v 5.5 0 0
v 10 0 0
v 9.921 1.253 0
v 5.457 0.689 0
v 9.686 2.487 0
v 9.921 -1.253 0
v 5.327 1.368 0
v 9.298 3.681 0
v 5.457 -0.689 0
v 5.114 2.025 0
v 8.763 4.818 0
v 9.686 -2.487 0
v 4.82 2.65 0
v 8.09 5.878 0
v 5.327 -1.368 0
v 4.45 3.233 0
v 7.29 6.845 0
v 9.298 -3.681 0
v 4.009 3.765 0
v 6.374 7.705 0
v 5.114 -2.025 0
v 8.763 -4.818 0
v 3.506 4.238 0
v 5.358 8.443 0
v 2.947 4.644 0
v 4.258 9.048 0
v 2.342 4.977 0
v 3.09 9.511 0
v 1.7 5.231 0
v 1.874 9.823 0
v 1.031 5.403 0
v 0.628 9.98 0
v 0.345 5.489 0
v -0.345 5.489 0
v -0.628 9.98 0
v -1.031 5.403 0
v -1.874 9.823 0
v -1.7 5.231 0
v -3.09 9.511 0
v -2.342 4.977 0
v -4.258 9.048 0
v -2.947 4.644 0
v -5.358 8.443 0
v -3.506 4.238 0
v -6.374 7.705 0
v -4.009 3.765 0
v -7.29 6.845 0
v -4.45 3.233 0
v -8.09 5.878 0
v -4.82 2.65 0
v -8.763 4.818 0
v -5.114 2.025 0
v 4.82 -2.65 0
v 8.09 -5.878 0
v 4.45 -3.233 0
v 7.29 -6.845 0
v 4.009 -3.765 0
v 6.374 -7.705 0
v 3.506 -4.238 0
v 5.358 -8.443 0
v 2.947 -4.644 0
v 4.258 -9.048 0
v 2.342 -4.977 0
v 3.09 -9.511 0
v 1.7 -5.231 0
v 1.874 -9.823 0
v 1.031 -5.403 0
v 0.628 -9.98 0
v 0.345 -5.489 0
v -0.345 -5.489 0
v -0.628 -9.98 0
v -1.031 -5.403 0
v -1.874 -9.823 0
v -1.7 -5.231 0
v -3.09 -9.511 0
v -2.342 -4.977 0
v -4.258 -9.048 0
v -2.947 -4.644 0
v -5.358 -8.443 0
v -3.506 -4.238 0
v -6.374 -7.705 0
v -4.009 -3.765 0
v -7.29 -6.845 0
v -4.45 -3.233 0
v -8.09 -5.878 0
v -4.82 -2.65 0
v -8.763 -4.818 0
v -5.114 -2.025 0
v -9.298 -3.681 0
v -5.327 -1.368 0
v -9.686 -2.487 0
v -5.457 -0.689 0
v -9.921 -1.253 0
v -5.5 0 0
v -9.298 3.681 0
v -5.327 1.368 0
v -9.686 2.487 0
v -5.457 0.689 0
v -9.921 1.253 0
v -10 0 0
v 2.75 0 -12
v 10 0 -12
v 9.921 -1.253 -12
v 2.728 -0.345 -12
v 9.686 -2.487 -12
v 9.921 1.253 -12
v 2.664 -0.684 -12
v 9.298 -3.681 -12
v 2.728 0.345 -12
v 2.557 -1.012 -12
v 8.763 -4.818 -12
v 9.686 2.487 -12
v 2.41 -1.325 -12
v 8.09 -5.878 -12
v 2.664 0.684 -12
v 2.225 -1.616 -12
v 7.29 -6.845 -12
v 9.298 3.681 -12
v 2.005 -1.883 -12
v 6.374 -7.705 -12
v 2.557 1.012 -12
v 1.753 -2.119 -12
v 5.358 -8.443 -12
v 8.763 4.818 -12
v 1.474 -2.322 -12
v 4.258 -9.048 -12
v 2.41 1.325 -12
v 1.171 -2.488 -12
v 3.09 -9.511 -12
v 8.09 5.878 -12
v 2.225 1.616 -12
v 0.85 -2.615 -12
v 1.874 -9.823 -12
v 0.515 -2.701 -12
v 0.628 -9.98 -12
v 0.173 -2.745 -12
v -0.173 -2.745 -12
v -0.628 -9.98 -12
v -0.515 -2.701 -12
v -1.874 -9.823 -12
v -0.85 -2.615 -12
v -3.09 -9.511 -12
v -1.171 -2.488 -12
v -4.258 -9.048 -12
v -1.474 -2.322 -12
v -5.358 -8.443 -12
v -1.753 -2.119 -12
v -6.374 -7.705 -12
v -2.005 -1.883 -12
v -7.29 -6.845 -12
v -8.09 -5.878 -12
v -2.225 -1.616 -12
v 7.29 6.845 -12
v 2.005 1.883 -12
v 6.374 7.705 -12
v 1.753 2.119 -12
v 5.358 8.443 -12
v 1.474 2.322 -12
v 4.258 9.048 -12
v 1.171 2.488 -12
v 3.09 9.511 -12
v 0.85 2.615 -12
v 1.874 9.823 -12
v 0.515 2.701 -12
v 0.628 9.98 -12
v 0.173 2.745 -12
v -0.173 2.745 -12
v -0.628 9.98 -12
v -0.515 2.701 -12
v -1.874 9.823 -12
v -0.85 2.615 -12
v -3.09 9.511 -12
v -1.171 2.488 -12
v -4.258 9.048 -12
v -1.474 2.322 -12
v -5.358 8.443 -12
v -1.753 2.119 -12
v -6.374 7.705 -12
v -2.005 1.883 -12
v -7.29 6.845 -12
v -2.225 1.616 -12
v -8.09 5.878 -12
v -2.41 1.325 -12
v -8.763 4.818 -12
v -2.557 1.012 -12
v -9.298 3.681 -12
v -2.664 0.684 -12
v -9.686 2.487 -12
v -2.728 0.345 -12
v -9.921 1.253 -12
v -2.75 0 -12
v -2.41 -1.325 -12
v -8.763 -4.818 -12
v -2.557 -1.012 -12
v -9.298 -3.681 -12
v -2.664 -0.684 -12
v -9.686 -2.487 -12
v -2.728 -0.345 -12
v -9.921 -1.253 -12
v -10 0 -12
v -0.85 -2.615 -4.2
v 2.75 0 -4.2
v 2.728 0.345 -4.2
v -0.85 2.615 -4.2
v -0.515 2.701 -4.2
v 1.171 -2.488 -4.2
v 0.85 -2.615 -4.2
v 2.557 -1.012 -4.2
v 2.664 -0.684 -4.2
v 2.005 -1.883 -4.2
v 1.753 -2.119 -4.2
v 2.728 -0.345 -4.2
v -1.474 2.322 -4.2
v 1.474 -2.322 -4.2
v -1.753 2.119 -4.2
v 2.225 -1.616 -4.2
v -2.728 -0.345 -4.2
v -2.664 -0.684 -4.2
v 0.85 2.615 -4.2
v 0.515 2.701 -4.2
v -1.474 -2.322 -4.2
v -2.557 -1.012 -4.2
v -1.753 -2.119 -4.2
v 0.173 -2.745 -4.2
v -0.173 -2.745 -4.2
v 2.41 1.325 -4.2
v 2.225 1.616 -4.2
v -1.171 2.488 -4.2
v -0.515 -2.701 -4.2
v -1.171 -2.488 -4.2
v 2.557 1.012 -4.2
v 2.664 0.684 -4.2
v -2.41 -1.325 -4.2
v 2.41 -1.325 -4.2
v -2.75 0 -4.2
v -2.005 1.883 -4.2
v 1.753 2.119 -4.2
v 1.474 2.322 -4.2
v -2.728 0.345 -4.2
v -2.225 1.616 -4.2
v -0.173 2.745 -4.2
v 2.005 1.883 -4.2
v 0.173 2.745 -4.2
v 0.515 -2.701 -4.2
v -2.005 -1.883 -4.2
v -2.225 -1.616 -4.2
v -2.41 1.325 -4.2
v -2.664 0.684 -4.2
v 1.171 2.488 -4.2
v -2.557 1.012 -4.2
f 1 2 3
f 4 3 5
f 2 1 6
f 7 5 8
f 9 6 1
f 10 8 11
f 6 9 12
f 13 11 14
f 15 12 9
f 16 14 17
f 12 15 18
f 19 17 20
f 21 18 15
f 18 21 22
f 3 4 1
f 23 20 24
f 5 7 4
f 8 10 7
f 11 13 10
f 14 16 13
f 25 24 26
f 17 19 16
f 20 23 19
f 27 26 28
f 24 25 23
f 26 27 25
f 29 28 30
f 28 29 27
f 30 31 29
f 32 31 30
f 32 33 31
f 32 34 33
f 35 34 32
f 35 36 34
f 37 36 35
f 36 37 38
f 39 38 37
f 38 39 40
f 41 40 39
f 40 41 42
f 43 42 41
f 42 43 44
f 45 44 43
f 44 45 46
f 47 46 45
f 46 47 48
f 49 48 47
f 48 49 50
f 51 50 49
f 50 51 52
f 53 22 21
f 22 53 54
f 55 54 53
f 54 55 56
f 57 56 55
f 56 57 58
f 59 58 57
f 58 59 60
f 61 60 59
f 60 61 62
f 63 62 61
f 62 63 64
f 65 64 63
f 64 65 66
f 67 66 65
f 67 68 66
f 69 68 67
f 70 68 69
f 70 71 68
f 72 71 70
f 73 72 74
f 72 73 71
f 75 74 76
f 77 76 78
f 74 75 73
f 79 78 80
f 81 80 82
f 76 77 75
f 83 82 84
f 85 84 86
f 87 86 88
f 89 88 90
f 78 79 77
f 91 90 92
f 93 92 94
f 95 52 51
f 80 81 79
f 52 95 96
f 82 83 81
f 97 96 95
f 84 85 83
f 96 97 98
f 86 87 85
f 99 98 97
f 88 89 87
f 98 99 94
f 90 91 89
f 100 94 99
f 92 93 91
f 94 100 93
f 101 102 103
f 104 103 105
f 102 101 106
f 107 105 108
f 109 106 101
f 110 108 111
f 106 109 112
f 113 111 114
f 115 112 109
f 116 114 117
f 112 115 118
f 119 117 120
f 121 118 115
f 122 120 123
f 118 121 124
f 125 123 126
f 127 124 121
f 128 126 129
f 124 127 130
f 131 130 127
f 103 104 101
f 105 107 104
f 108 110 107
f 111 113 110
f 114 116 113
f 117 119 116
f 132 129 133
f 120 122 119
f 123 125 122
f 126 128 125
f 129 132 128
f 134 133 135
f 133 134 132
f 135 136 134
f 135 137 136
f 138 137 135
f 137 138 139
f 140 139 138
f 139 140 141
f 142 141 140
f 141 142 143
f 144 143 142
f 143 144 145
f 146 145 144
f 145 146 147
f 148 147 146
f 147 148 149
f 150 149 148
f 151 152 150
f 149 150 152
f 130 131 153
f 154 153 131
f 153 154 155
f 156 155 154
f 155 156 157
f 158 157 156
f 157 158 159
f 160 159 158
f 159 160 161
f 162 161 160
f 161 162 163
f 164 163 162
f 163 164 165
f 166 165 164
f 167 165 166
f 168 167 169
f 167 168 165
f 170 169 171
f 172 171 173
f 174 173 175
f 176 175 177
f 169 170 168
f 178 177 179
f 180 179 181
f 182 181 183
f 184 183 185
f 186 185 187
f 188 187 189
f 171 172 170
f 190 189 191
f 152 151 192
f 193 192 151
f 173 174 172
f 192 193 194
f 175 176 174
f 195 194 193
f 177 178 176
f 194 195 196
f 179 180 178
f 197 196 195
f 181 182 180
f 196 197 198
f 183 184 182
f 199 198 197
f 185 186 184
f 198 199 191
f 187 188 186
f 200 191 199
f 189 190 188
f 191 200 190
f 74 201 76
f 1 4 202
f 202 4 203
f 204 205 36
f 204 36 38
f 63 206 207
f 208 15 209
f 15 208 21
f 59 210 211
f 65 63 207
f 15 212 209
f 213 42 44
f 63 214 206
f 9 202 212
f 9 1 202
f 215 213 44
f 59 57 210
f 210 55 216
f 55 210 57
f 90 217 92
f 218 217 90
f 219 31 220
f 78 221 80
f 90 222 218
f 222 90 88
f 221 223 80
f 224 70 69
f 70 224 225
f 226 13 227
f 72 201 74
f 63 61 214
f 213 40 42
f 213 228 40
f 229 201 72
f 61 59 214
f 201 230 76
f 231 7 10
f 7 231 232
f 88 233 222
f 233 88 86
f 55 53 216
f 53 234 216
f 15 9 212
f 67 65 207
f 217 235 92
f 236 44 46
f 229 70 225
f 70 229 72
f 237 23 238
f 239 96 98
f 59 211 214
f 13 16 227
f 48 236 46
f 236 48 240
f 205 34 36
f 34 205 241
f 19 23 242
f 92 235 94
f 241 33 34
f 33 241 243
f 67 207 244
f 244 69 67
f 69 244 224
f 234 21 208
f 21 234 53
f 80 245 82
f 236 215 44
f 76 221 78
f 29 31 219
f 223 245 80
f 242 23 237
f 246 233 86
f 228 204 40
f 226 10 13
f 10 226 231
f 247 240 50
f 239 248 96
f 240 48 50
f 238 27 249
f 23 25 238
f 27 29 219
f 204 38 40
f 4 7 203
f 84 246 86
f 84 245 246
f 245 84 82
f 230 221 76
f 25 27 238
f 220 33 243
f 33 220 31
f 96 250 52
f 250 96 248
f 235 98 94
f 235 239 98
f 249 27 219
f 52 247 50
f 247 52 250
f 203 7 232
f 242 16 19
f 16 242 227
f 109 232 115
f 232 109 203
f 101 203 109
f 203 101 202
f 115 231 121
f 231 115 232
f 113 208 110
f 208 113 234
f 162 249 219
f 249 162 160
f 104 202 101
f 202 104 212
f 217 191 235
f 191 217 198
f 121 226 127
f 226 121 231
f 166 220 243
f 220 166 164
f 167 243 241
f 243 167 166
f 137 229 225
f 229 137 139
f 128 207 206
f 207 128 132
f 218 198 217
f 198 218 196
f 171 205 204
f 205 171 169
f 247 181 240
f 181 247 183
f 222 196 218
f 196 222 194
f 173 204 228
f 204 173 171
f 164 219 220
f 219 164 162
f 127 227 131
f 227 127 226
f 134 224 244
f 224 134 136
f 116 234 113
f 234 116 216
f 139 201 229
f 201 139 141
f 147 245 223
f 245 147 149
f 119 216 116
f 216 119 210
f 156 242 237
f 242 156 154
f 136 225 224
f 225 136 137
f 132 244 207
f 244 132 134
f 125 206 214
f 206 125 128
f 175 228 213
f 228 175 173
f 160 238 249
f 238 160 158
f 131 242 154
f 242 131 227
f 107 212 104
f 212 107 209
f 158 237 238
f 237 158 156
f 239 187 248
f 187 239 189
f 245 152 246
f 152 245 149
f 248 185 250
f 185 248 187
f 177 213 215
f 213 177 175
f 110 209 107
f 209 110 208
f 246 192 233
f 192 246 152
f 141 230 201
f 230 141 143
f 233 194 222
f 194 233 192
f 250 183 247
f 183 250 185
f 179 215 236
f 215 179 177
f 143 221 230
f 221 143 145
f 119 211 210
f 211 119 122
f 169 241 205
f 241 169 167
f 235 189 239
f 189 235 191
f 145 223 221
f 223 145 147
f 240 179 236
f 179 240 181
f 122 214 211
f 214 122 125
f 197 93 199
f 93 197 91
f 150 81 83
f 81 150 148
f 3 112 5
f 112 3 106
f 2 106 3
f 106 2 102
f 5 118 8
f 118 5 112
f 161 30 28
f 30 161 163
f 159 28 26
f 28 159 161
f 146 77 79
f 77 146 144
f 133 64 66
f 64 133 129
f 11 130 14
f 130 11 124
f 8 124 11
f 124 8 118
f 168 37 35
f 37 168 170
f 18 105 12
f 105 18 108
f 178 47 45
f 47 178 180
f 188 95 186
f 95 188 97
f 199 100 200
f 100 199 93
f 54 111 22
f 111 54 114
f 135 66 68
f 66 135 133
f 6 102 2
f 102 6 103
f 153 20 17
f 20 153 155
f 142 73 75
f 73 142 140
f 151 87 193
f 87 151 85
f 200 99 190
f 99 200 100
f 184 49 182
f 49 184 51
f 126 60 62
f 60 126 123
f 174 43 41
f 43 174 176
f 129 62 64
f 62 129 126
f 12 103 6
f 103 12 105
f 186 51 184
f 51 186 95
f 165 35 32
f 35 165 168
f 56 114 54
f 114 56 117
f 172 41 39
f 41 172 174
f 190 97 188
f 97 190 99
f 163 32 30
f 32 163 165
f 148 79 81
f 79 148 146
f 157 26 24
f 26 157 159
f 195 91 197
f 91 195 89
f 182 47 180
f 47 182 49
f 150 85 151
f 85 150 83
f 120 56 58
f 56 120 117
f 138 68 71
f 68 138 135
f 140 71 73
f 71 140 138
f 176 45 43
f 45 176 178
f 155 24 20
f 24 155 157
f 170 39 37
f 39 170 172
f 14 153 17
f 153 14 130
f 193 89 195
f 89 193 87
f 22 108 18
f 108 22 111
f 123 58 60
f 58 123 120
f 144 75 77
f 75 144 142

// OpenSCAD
$fn = 50;


difference() {
	union() {
		translate(v = [0, 0, -12.0000000000]) {
			cylinder(h = 12, r = 10.0000000000);
		}
	}
	union() {
		translate(v = [0, 0, 0]) {
			rotate(a = [0, 0, 0]) {
				difference() {
					union() {
						#translate(v = [0, 0, -12.0000000000]) {
							cylinder(h = 12, r = 2.2500000000);
						}
						#translate(v = [0, 0, -4.2000000000]) {
							cylinder(h = 4.2000000000, r = 10.0000000000, r1 = 2.7500000000, r2 = 5.5000000000);
						}
						#translate(v = [0, 0, -12.0000000000]) {
							cylinder(h = 12, r = 2.7500000000);
						}
						#translate(v = [0, 0, -12.0000000000]) {
							cylinder(h = 12, r = 2.2500000000);
						}
					}
					union();
				}
			}
		}
	}
}
